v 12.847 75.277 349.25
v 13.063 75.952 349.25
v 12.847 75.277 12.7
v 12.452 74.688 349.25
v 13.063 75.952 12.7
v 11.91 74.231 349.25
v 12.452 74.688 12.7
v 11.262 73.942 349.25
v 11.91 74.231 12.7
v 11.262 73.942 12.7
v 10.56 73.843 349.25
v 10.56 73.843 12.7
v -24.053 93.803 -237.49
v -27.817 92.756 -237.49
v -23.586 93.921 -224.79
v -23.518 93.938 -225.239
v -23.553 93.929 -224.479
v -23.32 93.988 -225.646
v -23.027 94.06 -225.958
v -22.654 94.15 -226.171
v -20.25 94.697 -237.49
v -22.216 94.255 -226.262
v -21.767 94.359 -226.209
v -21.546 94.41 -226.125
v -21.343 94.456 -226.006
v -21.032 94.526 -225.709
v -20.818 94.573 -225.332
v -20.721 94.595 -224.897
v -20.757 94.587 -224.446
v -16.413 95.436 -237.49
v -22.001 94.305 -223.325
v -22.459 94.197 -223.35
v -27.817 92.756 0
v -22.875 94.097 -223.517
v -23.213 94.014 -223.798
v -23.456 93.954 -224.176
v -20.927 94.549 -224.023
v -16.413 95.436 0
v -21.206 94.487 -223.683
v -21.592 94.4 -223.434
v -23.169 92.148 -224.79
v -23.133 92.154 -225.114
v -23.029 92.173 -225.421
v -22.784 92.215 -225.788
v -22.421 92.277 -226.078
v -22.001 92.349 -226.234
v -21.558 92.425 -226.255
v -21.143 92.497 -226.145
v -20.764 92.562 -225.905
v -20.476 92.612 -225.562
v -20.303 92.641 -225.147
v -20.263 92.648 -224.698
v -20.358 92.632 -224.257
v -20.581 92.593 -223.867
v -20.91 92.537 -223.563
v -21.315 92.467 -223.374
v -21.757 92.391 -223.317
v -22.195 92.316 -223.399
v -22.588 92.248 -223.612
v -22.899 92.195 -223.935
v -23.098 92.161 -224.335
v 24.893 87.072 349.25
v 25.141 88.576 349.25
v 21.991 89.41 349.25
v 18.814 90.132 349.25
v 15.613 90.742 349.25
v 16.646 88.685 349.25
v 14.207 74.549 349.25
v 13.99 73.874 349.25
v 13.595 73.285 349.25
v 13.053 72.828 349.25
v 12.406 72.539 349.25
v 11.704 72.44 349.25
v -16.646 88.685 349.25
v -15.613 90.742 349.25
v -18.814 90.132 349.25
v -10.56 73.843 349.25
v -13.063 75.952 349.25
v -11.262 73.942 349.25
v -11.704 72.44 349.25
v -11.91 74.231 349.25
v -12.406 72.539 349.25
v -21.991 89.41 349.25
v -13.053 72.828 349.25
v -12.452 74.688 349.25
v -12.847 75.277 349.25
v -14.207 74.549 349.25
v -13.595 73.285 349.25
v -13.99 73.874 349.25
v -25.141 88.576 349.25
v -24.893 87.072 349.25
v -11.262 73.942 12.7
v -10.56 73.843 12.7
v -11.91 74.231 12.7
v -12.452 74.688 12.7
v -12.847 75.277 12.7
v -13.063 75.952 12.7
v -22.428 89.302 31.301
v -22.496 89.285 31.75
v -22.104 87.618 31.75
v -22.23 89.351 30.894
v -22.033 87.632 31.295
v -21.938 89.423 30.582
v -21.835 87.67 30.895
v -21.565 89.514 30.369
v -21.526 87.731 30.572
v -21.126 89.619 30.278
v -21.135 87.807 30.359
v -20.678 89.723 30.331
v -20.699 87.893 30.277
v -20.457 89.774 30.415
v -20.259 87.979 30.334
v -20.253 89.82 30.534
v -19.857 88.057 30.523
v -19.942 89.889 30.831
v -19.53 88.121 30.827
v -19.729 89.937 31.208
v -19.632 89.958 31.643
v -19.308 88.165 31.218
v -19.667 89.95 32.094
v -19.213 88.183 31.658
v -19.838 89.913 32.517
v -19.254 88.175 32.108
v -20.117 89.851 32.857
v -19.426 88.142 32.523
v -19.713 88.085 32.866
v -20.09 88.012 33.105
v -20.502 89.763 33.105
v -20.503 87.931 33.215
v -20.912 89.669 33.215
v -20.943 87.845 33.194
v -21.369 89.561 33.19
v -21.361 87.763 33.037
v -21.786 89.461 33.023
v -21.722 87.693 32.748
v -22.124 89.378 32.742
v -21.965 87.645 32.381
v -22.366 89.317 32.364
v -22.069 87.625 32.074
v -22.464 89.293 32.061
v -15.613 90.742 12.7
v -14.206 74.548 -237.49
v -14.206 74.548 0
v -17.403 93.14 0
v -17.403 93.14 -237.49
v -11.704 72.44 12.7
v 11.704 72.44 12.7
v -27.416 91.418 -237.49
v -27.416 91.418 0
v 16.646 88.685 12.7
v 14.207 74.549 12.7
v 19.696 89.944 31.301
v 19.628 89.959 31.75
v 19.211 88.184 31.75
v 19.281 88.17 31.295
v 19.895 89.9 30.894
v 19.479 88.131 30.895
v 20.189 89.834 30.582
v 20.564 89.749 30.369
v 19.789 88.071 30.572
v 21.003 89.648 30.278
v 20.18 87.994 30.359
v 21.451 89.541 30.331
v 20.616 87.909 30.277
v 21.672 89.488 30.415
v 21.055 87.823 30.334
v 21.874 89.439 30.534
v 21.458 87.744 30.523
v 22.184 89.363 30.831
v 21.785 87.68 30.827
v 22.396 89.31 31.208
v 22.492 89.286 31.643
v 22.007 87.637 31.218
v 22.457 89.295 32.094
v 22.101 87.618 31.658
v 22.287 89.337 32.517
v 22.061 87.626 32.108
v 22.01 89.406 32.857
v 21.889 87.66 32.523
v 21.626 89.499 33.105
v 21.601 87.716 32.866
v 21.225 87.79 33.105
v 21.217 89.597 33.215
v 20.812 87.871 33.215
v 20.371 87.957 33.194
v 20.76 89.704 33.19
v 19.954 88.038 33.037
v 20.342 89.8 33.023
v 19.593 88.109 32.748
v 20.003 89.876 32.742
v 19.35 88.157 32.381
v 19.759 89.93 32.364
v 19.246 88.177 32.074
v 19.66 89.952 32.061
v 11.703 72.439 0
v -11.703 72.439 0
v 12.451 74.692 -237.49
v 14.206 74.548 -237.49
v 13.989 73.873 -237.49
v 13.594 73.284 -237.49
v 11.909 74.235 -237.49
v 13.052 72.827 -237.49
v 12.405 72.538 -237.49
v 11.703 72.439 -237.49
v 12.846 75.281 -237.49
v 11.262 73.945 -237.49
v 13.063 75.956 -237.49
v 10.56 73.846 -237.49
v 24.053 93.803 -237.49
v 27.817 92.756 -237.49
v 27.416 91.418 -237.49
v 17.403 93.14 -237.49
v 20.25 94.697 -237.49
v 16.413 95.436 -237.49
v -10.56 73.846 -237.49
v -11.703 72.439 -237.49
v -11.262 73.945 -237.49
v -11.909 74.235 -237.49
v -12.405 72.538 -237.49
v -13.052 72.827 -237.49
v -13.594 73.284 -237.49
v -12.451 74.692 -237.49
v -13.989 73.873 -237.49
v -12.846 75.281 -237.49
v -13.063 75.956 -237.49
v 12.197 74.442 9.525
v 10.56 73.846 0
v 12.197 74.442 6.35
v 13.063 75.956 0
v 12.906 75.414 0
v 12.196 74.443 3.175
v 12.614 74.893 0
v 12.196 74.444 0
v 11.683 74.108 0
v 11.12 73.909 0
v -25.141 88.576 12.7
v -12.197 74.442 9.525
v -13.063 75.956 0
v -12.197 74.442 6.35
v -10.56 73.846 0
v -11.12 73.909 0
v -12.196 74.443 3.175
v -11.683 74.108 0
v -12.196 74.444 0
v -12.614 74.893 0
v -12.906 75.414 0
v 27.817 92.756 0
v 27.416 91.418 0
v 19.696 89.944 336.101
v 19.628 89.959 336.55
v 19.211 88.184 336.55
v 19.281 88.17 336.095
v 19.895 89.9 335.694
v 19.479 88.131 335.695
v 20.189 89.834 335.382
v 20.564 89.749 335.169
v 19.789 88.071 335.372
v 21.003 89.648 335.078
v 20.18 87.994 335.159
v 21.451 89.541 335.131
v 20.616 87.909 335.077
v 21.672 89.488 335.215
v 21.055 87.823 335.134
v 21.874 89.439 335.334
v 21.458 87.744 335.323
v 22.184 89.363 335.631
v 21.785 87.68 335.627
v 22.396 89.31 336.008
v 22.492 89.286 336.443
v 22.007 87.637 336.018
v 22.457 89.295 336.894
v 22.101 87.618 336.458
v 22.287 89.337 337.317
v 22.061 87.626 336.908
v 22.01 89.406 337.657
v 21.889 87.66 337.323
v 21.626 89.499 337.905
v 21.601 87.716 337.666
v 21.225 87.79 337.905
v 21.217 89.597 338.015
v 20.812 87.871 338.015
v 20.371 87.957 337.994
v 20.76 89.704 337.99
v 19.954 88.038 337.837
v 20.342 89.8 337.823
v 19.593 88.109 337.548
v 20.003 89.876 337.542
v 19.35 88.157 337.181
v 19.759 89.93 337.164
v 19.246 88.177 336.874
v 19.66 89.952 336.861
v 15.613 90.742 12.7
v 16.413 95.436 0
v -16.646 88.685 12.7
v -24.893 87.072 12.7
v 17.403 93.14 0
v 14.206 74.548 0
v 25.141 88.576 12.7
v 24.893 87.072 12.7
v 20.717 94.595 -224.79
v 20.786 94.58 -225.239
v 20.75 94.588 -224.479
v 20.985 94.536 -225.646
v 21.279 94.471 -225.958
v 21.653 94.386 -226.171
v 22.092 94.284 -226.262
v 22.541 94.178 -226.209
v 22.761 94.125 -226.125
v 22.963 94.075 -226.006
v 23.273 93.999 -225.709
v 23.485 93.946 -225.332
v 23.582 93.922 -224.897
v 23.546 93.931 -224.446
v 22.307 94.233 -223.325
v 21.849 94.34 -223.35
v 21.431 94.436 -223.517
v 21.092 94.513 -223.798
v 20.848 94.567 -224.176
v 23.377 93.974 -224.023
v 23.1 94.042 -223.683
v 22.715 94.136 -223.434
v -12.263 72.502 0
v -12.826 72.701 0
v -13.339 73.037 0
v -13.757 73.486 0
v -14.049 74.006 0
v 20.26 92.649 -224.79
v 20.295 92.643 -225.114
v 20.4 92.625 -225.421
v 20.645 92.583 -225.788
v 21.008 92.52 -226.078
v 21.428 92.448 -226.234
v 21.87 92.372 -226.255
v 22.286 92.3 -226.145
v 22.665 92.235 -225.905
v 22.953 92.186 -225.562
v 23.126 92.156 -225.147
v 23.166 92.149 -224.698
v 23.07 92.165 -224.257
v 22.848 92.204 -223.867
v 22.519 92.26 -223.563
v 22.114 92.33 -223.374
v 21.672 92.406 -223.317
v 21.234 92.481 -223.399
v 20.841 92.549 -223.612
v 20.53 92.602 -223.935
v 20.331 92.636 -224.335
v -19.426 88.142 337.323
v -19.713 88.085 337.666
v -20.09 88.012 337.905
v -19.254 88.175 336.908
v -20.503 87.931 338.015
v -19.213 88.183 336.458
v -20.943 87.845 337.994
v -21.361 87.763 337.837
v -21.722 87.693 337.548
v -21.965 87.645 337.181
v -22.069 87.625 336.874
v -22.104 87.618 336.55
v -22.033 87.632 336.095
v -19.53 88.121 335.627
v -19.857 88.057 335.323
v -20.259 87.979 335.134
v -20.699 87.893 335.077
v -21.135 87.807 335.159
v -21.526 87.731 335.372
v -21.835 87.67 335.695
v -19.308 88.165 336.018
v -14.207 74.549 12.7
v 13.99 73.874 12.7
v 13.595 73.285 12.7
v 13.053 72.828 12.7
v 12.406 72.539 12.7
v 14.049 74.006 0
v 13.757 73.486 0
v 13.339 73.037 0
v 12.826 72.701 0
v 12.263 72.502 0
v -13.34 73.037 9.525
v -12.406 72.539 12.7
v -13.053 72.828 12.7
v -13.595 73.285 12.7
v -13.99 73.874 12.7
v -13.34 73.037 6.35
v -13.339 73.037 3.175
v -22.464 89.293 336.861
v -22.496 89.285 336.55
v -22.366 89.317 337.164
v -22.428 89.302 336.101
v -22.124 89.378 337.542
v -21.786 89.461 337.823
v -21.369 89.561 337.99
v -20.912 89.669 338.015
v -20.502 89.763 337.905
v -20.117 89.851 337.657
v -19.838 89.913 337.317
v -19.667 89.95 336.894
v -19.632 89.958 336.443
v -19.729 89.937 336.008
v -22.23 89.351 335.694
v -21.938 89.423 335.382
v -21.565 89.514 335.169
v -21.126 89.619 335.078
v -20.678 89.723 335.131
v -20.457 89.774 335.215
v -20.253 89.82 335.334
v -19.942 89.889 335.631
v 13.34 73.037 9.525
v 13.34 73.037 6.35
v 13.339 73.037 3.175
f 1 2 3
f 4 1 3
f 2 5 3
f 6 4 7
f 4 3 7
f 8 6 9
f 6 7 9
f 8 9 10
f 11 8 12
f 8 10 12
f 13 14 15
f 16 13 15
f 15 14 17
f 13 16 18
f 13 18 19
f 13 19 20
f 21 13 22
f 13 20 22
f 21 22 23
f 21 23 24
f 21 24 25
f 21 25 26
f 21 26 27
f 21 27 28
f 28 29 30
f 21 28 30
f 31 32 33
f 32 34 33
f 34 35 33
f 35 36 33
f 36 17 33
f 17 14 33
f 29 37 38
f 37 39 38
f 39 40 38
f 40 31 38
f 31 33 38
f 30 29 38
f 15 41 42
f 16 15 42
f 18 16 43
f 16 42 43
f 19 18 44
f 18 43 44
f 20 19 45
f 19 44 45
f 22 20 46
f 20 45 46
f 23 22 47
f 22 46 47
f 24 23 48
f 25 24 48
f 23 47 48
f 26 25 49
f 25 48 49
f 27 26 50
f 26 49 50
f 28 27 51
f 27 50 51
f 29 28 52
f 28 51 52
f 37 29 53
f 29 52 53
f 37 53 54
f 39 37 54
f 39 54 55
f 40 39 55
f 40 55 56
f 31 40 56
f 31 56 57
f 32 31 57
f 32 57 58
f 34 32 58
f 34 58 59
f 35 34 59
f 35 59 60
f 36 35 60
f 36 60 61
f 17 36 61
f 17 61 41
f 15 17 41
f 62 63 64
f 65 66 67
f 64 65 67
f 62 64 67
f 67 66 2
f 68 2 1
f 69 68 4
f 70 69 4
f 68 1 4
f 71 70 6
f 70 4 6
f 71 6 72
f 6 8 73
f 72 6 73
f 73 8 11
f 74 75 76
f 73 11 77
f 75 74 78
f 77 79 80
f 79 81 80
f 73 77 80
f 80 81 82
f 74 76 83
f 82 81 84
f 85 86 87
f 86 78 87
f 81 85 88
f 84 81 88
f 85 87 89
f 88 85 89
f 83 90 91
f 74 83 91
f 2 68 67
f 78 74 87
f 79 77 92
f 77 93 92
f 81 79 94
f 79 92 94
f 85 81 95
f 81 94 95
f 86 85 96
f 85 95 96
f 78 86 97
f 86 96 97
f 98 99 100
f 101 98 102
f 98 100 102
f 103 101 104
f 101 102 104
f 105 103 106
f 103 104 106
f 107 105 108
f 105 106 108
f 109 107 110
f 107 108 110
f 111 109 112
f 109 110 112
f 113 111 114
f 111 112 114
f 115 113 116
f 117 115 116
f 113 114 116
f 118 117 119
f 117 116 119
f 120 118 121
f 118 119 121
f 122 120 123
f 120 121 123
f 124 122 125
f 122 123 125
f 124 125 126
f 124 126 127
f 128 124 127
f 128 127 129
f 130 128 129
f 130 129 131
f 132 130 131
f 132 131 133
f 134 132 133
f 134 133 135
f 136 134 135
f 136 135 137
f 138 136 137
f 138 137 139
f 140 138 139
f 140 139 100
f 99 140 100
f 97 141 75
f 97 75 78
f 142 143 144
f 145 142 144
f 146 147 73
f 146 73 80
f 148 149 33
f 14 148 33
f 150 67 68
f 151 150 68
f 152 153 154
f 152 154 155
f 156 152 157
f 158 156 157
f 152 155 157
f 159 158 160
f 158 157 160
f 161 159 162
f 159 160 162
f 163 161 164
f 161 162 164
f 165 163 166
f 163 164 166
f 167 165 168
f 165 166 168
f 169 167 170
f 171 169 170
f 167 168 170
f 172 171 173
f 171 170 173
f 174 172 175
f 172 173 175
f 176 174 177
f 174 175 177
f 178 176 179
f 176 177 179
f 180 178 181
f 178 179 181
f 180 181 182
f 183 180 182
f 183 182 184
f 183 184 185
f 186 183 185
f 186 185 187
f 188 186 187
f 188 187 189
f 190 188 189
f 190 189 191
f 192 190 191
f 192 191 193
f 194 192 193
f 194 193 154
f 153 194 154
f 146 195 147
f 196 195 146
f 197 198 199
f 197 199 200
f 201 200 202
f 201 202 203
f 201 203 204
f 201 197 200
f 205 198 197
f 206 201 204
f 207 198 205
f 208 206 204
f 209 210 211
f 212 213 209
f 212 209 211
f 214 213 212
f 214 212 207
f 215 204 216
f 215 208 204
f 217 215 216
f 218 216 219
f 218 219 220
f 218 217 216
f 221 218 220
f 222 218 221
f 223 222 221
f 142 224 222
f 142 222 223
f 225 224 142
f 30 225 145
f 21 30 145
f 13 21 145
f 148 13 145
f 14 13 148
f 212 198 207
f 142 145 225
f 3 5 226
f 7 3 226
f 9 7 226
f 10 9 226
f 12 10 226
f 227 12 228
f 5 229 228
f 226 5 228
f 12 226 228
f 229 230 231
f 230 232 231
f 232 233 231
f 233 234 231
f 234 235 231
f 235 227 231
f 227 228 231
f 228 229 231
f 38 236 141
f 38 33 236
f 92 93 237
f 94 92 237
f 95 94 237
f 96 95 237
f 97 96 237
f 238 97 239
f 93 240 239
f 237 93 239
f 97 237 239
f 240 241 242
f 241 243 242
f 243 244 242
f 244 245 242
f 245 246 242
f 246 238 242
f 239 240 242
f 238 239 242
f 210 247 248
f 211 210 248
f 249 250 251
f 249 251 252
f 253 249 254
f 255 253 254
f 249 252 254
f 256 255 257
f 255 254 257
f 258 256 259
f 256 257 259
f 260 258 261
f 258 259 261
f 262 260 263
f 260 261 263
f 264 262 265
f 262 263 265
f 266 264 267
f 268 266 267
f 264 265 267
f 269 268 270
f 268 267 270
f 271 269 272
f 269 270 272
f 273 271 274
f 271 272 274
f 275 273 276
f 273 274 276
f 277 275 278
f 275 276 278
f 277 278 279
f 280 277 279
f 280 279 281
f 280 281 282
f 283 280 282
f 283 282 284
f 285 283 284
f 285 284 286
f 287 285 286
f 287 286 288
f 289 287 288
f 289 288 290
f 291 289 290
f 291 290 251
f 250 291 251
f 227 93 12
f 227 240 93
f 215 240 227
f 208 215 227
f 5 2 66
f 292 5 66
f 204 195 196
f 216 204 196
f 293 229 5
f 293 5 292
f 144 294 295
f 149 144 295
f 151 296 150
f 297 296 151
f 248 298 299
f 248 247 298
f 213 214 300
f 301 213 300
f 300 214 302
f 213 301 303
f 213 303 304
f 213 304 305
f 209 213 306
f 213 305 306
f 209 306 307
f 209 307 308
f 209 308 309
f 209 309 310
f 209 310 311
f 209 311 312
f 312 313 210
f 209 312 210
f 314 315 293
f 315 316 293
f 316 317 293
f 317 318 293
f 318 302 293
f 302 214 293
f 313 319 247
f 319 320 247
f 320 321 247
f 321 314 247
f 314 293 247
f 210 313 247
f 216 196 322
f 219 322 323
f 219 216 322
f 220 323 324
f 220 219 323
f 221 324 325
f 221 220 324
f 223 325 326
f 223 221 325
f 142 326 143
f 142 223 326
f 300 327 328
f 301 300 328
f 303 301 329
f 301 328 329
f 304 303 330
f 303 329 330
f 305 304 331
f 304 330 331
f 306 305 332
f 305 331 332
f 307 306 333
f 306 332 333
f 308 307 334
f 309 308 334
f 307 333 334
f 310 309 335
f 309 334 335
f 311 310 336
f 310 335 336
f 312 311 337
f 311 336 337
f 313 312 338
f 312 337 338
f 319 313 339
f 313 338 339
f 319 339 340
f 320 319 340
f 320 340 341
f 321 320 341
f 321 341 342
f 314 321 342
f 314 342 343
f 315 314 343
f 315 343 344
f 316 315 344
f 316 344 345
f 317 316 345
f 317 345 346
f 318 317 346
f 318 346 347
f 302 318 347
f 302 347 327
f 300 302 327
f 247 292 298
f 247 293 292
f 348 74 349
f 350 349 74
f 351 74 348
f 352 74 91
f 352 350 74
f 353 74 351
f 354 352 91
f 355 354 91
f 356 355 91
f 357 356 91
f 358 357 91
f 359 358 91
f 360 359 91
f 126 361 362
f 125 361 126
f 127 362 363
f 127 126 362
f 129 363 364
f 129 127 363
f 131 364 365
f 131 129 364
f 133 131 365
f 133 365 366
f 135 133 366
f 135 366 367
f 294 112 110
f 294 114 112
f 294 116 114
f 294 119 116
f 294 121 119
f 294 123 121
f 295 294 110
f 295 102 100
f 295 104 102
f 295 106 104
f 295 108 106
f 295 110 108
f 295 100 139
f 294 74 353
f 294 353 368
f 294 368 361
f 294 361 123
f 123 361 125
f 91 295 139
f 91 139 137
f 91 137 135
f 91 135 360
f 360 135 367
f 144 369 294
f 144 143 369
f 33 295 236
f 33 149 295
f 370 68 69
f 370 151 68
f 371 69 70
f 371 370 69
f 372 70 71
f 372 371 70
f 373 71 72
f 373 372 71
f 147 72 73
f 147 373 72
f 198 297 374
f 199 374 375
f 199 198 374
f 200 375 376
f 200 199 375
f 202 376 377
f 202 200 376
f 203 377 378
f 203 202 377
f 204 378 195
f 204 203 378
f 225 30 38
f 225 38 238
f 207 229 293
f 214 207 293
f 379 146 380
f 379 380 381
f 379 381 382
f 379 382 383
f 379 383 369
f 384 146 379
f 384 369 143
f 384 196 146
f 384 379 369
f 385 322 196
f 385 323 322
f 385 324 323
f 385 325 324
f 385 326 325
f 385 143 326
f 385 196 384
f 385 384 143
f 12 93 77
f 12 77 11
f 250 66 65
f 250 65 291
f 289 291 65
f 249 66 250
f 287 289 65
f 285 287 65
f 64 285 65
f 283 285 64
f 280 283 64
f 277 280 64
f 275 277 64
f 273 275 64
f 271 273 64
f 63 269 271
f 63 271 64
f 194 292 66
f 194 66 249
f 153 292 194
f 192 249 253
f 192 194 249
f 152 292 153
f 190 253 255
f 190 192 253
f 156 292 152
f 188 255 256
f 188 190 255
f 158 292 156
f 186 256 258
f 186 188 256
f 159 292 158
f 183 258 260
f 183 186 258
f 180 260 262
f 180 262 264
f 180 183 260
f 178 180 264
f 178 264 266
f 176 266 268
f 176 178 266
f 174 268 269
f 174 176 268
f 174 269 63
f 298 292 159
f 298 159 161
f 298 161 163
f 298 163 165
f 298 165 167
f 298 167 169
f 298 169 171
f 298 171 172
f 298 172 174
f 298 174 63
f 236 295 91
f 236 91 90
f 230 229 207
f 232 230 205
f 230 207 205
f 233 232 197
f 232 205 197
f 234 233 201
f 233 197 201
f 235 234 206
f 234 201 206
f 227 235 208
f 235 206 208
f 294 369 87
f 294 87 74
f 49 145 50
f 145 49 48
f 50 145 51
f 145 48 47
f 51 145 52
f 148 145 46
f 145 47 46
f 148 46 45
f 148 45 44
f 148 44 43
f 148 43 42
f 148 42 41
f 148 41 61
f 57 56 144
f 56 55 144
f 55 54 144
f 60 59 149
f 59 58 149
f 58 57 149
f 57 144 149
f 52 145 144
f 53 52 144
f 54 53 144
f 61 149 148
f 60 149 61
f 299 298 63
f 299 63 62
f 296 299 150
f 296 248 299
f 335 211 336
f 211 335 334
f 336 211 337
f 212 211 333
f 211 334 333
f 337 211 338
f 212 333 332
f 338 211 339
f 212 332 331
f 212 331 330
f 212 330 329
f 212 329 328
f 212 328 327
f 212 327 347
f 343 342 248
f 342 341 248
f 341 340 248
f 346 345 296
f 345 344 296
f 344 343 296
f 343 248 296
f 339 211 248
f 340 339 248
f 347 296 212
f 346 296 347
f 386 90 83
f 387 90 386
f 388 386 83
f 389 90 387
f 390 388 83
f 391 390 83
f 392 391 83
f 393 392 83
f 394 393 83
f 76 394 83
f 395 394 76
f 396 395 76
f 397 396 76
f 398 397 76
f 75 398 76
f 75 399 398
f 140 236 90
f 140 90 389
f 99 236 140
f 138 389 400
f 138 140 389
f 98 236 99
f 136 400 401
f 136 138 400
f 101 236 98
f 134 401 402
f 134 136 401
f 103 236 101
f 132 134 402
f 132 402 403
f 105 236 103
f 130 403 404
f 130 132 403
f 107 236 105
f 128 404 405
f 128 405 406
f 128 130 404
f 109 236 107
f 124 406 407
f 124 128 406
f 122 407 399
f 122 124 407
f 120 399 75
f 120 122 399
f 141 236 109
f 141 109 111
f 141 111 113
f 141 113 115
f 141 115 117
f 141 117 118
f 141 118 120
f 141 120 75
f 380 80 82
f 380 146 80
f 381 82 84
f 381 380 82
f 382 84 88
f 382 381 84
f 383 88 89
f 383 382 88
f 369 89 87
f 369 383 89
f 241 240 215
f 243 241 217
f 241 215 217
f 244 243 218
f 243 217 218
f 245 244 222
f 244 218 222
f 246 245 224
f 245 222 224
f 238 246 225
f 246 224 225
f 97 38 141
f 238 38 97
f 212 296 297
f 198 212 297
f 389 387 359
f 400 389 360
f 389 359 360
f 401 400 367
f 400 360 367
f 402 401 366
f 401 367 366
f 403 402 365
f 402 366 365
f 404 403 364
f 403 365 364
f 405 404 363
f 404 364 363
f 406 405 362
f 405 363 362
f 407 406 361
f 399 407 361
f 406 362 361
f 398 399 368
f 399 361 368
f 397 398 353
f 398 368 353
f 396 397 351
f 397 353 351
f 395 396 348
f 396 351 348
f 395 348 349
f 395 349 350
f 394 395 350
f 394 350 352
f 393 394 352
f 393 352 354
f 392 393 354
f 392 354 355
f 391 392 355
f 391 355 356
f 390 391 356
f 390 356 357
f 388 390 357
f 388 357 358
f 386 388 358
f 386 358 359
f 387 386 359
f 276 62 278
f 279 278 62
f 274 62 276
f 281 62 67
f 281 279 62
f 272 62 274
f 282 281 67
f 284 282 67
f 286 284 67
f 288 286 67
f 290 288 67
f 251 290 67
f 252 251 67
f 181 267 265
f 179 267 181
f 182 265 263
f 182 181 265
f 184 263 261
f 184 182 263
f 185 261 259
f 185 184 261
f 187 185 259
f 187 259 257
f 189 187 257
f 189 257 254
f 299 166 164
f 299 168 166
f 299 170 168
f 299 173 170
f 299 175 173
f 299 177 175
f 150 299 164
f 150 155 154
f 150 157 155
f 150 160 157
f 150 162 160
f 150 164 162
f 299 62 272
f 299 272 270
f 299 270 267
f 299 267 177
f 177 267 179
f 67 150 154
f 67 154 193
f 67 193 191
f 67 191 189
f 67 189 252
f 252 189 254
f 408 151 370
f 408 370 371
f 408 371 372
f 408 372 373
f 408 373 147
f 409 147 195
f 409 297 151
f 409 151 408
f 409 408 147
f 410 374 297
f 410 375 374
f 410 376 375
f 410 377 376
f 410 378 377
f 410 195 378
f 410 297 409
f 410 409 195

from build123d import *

# Parameters (mm, degrees)
BOSS_EXTRUDE1_DEPTH       = 237.49
BOSS_EXTRUDE2_DEPTH       = 336.55
FILLET1_R                 = 2.54
FILLET2_R                 = 2.54
F_4_CLEARANCE_HOLE3_D     = 2.9464
F_4_CLEARANCE_HOLE3_DEPTH = 25.4
F_4_CLEARANCE_HOLE3_TIP   = 0.885187864
F_4_CLEARANCE_HOLE4_D     = 2.9464
F_4_CLEARANCE_HOLE4_DEPTH = 25.4
F_4_CLEARANCE_HOLE4_TIP   = 0.885187864
F_4_CLEARANCE_HOLE5_D     = 2.9464
F_4_CLEARANCE_HOLE5_DEPTH = 12.7
F_4_CLEARANCE_HOLE5_TIP   = 0.885187864
F_4_CLEARANCE_HOLE6_D     = 2.9464
F_4_CLEARANCE_HOLE6_DEPTH = 12.7
F_4_CLEARANCE_HOLE6_TIP   = 0.885187864


with BuildPart() as part:
    # 3DSketch1 for Loft2 → Loft2 section 0
    with BuildSketch(Plane(origin=(25.14093528, 88.576176245, 12.7), x_dir=(-0.2730484418088959, -0.9620002850445181, 0), z_dir=(0, 0, -1))):
        with BuildLine():
            Line((0, 0), (1.514242104, -0.172182612))
            Line((1.514242104, -0.172182612), (2.214491758, 8.20179449))
            Line((2.214491758, 8.20179449), (18.60742462, 6.462791205))
            Line((18.60742462, 6.462791205), (26.167043779, 33.096731096))
            Line((26.167043779, 33.096731096), (11.304898639, 40.22898334))
            Line((11.304898639, 40.22898334), (15.108293839, 47.722182058))
            Line((15.108293839, 47.722182058), (13.729386407, 48.37117381))
            # circular arc as an exact rational Bezier (weights 1, cos(half-angle), 1)
            Bezier((13.729386407, 48.37117381), (11.15915023, 44.208224795), (9.044543669, 39.796343381), weights=[1, 0.998591281, 1])
            Line((9.044543669, 39.796343381), (24.505322138, 32.380234952))
            Line((24.505322138, 32.380234952), (17.569891716, 7.945427712))
            Line((17.569891716, 7.945427712), (0.518465753, 9.757390103))
            Bezier((0.518465753, 9.757390103), (0, 4.892469572), (0, 0), weights=[1, 0.998591281, 1])
        make_face()
    # Sketch1 for Loft2 → Loft2 section 1
    with BuildSketch(Plane.XY):
        with BuildLine():
            Line((-12.7, 73.846441258), (12.7, 73.846441258))
            Line((12.7, 73.846441258), (16.413015757, 95.436441258))
            Bezier((16.413015757, 95.436441258), (22.196437798, 94.441817026), (27.817431193, 92.756088361), weights=[1, 0.998168879, 1])
            Line((27.817431193, 92.756088361), (27.416130546, 91.417967742))
            Line((27.416130546, 91.417967742), (17.403126873, 93.139989068))
            Line((17.403126873, 93.139989068), (13.843, 72.438989068))
            Line((13.843, 72.438989068), (-13.843, 72.438989068))
            Line((-13.843, 72.438989068), (-17.403126873, 93.139989068))
            Line((-17.403126873, 93.139989068), (-27.416130546, 91.417967742))
            Line((-27.416130546, 91.417967742), (-27.817431193, 92.756088361))
            Bezier((-27.817431193, 92.756088361), (-22.196437798, 94.441817026), (-16.413015757, 95.436441258), weights=[1, 0.998168879, 1])
            Line((-16.413015757, 95.436441258), (-12.7, 73.846441258))
        make_face()
    loft()

    # Sketch1<4> → Boss-Extrude1 (add)
    with BuildSketch(Plane.XY):
        with BuildLine():
            Line((-12.7, 73.846441258), (12.7, 73.846441258))
            Line((12.7, 73.846441258), (16.413015757, 95.436441258))
            ThreePointArc((16.413015757, 95.436441258), (22.155793424, 94.268882586), (27.817431193, 92.756088361))
            Line((27.817431193, 92.756088361), (27.416130546, 91.417967742))
            Line((27.416130546, 91.417967742), (17.403126873, 93.139989068))
            Line((17.403126873, 93.139989068), (13.843, 72.438989068))
            Line((13.843, 72.438989068), (-13.843, 72.438989068))
            Line((-13.843, 72.438989068), (-17.403126873, 93.139989068))
            Line((-17.403126873, 93.139989068), (-27.416130546, 91.417967742))
            Line((-27.416130546, 91.417967742), (-27.817431193, 92.756088361))
            ThreePointArc((-27.817431193, 92.756088361), (-22.155793424, 94.268882586), (-16.413015757, 95.436441258))
            Line((-16.413015757, 95.436441258), (-12.7, 73.846441258))
        make_face()
    extrude(amount=-BOSS_EXTRUDE1_DEPTH)

    # 3DSketch1<4> → Boss-Extrude2 (add)
    with BuildSketch(Plane(origin=(25.14093528, 88.576176245, 12.7), x_dir=(-0.2730484418088959, -0.9620002850445181, 0), z_dir=(0, 0, -1))):
        with BuildLine():
            Line((0, 0), (1.514242104, -0.172182612))
            Line((1.514242104, -0.172182612), (2.214491758, 8.20179449))
            Line((2.214491758, 8.20179449), (18.60742462, 6.462791205))
            Line((18.60742462, 6.462791205), (26.167043779, 33.096731096))
            Line((26.167043779, 33.096731096), (11.304898639, 40.22898334))
            Line((11.304898639, 40.22898334), (15.108293839, 47.722182058))
            Line((15.108293839, 47.722182058), (13.729386407, 48.37117381))
            ThreePointArc((13.729386407, 48.37117381), (11.273137923, 44.14594783), (9.044543669, 39.796343381))
            Line((9.044543669, 39.796343381), (24.505322138, 32.380234952))
            Line((24.505322138, 32.380234952), (17.569891716, 7.945427712))
            Line((17.569891716, 7.945427712), (0.518465753, 9.757390103))
            ThreePointArc((0.518465753, 9.757390103), (0.129707799, 4.885577457), (0, 0))
        make_face()
    extrude(amount=-BOSS_EXTRUDE2_DEPTH)

    # Fillet1
    fillet1_edges = [part.edges().sort_by_distance(p)[0] for p in [
        (-13.843, 72.438989068, -118.745),
        (-13.843, 72.439736297, 6.35),
        (13.843, 72.438989068, -118.745),
        (13.843, 72.439736297, 6.35),
        (-13.843, 72.440483526, 180.975),
        (13.843, 72.440483526, 180.975),
    ]]
    fillet(fillet1_edges, radius=FILLET1_R)

    # Fillet2
    fillet2_edges = [part.edges().sort_by_distance(p)[0] for p in [
        (-12.7, 73.846441258, -118.745),
        (-12.7, 73.844931661, 6.35),
        (12.7, 73.846441258, -118.745),
        (12.7, 73.844931661, 6.35),
        (-12.7, 73.843422063, 180.975),
        (12.7, 73.843422063, 180.975),
    ]]
    fillet(fillet2_edges, radius=FILLET2_R)

    # #4 Clearance Hole3
    with Locations(Plane(origin=(21.064518185, 89.633094885, 0), x_dir=(0.9734791733351508, -0.22877565229436342, 0), z_dir=(0.22877565229436345, 0.9734791733351509, 0))):
        with Locations((0, -336.55), (0, -31.75)):
            Hole(F_4_CLEARANCE_HOLE3_D / 2, depth=F_4_CLEARANCE_HOLE3_DEPTH)
            with Locations((0, 0, -(F_4_CLEARANCE_HOLE3_DEPTH + F_4_CLEARANCE_HOLE3_TIP / 2))):  # 118° drill point
                Cone(0, F_4_CLEARANCE_HOLE3_D / 2, F_4_CLEARANCE_HOLE3_TIP, mode=Mode.SUBTRACT)

    # #4 Clearance Hole4
    with Locations(Plane(origin=(-21.064518185, 89.633094885, 0), x_dir=(0.9734791733351509, 0.2287756522943629, 0), z_dir=(-0.2287756522943629, 0.9734791733351509, 0))):
        with Locations((0, -336.55), (0, -31.75)):
            Hole(F_4_CLEARANCE_HOLE4_D / 2, depth=F_4_CLEARANCE_HOLE4_DEPTH)
            with Locations((0, 0, -(F_4_CLEARANCE_HOLE4_DEPTH + F_4_CLEARANCE_HOLE4_TIP / 2))):  # 118° drill point
                Cone(0, F_4_CLEARANCE_HOLE4_D / 2, F_4_CLEARANCE_HOLE4_TIP, mode=Mode.SUBTRACT)

    # #4 Clearance Hole5
    with Locations(Plane(origin=(-22.154062229, 94.269289448, 0), x_dir=(0.9734791733351509, 0.2287756522943629, 0), z_dir=(-0.2287756522943629, 0.9734791733351509, 0))):
        with Locations((0, 224.79)):
            Hole(F_4_CLEARANCE_HOLE5_D / 2, depth=F_4_CLEARANCE_HOLE5_DEPTH)
            with Locations((0, 0, -(F_4_CLEARANCE_HOLE5_DEPTH + F_4_CLEARANCE_HOLE5_TIP / 2))):  # 118° drill point
                Cone(0, F_4_CLEARANCE_HOLE5_D / 2, F_4_CLEARANCE_HOLE5_TIP, mode=Mode.SUBTRACT)

    # #4 Clearance Hole6
    with Locations(Plane(origin=(22.154062229, 94.269289448, 0), x_dir=(0.9734791733351508, -0.22877565229436342, 0), z_dir=(0.22877565229436345, 0.9734791733351509, 0))):
        with Locations((0, 224.79)):
            Hole(F_4_CLEARANCE_HOLE6_D / 2, depth=F_4_CLEARANCE_HOLE6_DEPTH)
            with Locations((0, 0, -(F_4_CLEARANCE_HOLE6_DEPTH + F_4_CLEARANCE_HOLE6_TIP / 2))):  # 118° drill point
                Cone(0, F_4_CLEARANCE_HOLE6_D / 2, F_4_CLEARANCE_HOLE6_TIP, mode=Mode.SUBTRACT)


solid = part.part
